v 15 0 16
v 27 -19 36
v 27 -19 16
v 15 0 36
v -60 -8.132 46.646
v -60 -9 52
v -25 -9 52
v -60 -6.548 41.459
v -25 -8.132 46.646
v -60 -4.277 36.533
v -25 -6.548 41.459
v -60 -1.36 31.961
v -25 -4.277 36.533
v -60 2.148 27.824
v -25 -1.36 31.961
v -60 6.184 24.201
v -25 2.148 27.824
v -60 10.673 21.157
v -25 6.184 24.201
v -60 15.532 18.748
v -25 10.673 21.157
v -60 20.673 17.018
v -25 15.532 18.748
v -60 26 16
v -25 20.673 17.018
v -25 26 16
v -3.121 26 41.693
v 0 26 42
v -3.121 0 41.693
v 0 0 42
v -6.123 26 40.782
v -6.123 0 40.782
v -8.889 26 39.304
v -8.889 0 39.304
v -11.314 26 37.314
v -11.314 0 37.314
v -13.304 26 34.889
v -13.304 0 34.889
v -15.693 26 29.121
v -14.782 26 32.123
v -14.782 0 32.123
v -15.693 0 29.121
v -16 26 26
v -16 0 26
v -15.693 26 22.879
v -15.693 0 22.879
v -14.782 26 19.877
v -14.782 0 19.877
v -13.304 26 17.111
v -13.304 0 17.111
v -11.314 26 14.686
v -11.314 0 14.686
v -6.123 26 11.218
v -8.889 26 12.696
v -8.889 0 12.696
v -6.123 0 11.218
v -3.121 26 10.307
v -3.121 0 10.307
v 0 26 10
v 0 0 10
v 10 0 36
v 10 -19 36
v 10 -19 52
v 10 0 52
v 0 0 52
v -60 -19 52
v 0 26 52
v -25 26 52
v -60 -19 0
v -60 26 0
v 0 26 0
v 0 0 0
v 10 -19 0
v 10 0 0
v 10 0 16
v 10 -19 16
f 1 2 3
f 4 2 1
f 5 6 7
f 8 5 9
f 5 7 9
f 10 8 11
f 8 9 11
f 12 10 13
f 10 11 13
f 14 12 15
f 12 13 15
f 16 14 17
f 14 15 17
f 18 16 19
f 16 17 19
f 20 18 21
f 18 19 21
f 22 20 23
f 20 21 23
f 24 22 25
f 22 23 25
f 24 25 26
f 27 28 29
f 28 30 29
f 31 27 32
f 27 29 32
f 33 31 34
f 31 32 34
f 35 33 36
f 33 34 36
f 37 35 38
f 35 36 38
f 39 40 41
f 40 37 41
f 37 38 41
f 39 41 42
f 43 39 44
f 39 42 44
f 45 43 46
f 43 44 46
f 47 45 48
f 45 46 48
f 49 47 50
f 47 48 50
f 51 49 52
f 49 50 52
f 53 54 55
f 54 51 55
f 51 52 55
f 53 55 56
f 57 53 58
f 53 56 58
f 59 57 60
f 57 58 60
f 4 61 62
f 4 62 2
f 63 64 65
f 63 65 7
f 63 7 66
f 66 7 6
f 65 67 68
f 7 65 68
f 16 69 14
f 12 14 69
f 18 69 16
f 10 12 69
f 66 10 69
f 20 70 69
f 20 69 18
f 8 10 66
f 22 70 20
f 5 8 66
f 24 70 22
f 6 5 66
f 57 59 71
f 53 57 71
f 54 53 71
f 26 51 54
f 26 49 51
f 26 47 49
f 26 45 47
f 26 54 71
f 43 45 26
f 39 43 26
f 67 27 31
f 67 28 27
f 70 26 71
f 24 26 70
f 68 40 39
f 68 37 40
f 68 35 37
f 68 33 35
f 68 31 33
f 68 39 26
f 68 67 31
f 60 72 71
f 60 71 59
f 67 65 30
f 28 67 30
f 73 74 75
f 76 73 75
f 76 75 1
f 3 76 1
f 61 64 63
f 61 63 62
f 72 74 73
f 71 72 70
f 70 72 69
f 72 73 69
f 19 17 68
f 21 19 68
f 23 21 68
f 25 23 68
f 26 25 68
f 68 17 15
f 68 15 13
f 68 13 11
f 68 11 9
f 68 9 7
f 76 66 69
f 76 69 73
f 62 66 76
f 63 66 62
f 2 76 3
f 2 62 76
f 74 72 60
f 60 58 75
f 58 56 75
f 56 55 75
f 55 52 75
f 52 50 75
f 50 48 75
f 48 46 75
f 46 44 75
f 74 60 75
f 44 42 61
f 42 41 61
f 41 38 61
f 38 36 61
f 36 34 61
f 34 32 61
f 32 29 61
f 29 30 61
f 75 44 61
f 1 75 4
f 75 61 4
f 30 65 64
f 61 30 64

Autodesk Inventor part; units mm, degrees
ref_plane "YZ Plane" through (0, 0, 0) normal (1, 0, 0) x (0, 1, 0)
ref_plane "XZ Plane" through (0, 0, 0) normal (0, 1, 0) x (-1, 0, 0)
ref_plane "XY Plane" through (0, 0, 0) normal (0, 0, 1) x (1, 0, 0)
sketch "Sketch1" plane through (0, 0, 0) normal (0, 1, 0) x (-1, 0, 0)
  line L0 (0, 0) -> (25, 0)
  line L1 (25, 0) -> (25, 52)
  line L2 (25, 52) -> (0, 52)
  line L3 (0, 52) -> (0, 42)
  line L4 (0, 0) -> (0, 10)
  arc A0 (0, 10) -> (0, 42) centre (0, 26) ccw
  dimension "d0" = 25
  dimension "d1" = 52
  dimension "d3" = 10
  dimension "d4" = 10
  dimension "d5" = 16
extrude "Extrusion1" add sketch "Sketch1" along normal blind 26
sketch "Sketch2" plane through (-25, 0, 0) normal (-1, 0, 0) x (0, 0, 1)
  line L0 (0, 26) -> (0, -19)
  line L1 (0, -19) -> (52, -19)
  line L2 (52, -19) -> (52, -9)
  line L3 (0, 26) -> (16, 26)
  line L4 (0, 26) -> (52, 26) projected
  arc A0 (16, 26) -> (52, -9) centre (55.7076, 30.8278) ccw
  point P0 (0, 0)
  dimension "d8" = 45
  dimension "d9" = 52
  dimension "d10" = 90
  dimension "d11" = 10
  dimension "d12" = 90
  dimension "d13" = 16
  dimension "d17" = 40
extrude "Extrusion2" add sketch "Sketch2" along normal blind 35
sketch "Sketch3" plane through (0, 0, 0) normal (0, -1, 0) x (1, 0, 0)
  line L0 (-25, 0) -> (-25, 30.2194) projected
  line L1 (-25, 0) -> (10, 0)
  line L2 (10, 52) -> (-25, 52)
  line L3 (-25, 52) -> (-25, 0)
  line L4 (10, 0) -> (10, 16)
  line L5 (10, 52) -> (10, 36)
  line L6 (10, 16) -> (15, 16)
  line L7 (15, 16) -> (15, 36)
  line L8 (15, 36) -> (10, 36)
  line L9 (10, 36) -> (10, 16)
  point P0 (0, 0)
  point P1 (10, 36)
  dimension "d18" = 35
  dimension "d19" = 16
  dimension "d20" = 16
  dimension "d21" = 5
  dimension "d27" = 35
extrude "Extrusion3" add sketch "Sketch3" along normal blind 19
sketch "Sketch4" plane through (10, 0, 36) normal (0, 0, 1) x (1, 0, 0)
  line L0 (5, 0) -> (5, -19) projected
  line L1 (5, -19) -> (17, -19)
  line L2 (17, -19) -> (5, 0)
  line L3 (5, 0) -> (5, -19)
  point P0 (-10, 0)
  dimension "d24" = 12
extrude "Extrusion4" add sketch "Sketch4" against normal blind 20
equation "\"d20\" = d19"
equation "\"d27\" = d18"
